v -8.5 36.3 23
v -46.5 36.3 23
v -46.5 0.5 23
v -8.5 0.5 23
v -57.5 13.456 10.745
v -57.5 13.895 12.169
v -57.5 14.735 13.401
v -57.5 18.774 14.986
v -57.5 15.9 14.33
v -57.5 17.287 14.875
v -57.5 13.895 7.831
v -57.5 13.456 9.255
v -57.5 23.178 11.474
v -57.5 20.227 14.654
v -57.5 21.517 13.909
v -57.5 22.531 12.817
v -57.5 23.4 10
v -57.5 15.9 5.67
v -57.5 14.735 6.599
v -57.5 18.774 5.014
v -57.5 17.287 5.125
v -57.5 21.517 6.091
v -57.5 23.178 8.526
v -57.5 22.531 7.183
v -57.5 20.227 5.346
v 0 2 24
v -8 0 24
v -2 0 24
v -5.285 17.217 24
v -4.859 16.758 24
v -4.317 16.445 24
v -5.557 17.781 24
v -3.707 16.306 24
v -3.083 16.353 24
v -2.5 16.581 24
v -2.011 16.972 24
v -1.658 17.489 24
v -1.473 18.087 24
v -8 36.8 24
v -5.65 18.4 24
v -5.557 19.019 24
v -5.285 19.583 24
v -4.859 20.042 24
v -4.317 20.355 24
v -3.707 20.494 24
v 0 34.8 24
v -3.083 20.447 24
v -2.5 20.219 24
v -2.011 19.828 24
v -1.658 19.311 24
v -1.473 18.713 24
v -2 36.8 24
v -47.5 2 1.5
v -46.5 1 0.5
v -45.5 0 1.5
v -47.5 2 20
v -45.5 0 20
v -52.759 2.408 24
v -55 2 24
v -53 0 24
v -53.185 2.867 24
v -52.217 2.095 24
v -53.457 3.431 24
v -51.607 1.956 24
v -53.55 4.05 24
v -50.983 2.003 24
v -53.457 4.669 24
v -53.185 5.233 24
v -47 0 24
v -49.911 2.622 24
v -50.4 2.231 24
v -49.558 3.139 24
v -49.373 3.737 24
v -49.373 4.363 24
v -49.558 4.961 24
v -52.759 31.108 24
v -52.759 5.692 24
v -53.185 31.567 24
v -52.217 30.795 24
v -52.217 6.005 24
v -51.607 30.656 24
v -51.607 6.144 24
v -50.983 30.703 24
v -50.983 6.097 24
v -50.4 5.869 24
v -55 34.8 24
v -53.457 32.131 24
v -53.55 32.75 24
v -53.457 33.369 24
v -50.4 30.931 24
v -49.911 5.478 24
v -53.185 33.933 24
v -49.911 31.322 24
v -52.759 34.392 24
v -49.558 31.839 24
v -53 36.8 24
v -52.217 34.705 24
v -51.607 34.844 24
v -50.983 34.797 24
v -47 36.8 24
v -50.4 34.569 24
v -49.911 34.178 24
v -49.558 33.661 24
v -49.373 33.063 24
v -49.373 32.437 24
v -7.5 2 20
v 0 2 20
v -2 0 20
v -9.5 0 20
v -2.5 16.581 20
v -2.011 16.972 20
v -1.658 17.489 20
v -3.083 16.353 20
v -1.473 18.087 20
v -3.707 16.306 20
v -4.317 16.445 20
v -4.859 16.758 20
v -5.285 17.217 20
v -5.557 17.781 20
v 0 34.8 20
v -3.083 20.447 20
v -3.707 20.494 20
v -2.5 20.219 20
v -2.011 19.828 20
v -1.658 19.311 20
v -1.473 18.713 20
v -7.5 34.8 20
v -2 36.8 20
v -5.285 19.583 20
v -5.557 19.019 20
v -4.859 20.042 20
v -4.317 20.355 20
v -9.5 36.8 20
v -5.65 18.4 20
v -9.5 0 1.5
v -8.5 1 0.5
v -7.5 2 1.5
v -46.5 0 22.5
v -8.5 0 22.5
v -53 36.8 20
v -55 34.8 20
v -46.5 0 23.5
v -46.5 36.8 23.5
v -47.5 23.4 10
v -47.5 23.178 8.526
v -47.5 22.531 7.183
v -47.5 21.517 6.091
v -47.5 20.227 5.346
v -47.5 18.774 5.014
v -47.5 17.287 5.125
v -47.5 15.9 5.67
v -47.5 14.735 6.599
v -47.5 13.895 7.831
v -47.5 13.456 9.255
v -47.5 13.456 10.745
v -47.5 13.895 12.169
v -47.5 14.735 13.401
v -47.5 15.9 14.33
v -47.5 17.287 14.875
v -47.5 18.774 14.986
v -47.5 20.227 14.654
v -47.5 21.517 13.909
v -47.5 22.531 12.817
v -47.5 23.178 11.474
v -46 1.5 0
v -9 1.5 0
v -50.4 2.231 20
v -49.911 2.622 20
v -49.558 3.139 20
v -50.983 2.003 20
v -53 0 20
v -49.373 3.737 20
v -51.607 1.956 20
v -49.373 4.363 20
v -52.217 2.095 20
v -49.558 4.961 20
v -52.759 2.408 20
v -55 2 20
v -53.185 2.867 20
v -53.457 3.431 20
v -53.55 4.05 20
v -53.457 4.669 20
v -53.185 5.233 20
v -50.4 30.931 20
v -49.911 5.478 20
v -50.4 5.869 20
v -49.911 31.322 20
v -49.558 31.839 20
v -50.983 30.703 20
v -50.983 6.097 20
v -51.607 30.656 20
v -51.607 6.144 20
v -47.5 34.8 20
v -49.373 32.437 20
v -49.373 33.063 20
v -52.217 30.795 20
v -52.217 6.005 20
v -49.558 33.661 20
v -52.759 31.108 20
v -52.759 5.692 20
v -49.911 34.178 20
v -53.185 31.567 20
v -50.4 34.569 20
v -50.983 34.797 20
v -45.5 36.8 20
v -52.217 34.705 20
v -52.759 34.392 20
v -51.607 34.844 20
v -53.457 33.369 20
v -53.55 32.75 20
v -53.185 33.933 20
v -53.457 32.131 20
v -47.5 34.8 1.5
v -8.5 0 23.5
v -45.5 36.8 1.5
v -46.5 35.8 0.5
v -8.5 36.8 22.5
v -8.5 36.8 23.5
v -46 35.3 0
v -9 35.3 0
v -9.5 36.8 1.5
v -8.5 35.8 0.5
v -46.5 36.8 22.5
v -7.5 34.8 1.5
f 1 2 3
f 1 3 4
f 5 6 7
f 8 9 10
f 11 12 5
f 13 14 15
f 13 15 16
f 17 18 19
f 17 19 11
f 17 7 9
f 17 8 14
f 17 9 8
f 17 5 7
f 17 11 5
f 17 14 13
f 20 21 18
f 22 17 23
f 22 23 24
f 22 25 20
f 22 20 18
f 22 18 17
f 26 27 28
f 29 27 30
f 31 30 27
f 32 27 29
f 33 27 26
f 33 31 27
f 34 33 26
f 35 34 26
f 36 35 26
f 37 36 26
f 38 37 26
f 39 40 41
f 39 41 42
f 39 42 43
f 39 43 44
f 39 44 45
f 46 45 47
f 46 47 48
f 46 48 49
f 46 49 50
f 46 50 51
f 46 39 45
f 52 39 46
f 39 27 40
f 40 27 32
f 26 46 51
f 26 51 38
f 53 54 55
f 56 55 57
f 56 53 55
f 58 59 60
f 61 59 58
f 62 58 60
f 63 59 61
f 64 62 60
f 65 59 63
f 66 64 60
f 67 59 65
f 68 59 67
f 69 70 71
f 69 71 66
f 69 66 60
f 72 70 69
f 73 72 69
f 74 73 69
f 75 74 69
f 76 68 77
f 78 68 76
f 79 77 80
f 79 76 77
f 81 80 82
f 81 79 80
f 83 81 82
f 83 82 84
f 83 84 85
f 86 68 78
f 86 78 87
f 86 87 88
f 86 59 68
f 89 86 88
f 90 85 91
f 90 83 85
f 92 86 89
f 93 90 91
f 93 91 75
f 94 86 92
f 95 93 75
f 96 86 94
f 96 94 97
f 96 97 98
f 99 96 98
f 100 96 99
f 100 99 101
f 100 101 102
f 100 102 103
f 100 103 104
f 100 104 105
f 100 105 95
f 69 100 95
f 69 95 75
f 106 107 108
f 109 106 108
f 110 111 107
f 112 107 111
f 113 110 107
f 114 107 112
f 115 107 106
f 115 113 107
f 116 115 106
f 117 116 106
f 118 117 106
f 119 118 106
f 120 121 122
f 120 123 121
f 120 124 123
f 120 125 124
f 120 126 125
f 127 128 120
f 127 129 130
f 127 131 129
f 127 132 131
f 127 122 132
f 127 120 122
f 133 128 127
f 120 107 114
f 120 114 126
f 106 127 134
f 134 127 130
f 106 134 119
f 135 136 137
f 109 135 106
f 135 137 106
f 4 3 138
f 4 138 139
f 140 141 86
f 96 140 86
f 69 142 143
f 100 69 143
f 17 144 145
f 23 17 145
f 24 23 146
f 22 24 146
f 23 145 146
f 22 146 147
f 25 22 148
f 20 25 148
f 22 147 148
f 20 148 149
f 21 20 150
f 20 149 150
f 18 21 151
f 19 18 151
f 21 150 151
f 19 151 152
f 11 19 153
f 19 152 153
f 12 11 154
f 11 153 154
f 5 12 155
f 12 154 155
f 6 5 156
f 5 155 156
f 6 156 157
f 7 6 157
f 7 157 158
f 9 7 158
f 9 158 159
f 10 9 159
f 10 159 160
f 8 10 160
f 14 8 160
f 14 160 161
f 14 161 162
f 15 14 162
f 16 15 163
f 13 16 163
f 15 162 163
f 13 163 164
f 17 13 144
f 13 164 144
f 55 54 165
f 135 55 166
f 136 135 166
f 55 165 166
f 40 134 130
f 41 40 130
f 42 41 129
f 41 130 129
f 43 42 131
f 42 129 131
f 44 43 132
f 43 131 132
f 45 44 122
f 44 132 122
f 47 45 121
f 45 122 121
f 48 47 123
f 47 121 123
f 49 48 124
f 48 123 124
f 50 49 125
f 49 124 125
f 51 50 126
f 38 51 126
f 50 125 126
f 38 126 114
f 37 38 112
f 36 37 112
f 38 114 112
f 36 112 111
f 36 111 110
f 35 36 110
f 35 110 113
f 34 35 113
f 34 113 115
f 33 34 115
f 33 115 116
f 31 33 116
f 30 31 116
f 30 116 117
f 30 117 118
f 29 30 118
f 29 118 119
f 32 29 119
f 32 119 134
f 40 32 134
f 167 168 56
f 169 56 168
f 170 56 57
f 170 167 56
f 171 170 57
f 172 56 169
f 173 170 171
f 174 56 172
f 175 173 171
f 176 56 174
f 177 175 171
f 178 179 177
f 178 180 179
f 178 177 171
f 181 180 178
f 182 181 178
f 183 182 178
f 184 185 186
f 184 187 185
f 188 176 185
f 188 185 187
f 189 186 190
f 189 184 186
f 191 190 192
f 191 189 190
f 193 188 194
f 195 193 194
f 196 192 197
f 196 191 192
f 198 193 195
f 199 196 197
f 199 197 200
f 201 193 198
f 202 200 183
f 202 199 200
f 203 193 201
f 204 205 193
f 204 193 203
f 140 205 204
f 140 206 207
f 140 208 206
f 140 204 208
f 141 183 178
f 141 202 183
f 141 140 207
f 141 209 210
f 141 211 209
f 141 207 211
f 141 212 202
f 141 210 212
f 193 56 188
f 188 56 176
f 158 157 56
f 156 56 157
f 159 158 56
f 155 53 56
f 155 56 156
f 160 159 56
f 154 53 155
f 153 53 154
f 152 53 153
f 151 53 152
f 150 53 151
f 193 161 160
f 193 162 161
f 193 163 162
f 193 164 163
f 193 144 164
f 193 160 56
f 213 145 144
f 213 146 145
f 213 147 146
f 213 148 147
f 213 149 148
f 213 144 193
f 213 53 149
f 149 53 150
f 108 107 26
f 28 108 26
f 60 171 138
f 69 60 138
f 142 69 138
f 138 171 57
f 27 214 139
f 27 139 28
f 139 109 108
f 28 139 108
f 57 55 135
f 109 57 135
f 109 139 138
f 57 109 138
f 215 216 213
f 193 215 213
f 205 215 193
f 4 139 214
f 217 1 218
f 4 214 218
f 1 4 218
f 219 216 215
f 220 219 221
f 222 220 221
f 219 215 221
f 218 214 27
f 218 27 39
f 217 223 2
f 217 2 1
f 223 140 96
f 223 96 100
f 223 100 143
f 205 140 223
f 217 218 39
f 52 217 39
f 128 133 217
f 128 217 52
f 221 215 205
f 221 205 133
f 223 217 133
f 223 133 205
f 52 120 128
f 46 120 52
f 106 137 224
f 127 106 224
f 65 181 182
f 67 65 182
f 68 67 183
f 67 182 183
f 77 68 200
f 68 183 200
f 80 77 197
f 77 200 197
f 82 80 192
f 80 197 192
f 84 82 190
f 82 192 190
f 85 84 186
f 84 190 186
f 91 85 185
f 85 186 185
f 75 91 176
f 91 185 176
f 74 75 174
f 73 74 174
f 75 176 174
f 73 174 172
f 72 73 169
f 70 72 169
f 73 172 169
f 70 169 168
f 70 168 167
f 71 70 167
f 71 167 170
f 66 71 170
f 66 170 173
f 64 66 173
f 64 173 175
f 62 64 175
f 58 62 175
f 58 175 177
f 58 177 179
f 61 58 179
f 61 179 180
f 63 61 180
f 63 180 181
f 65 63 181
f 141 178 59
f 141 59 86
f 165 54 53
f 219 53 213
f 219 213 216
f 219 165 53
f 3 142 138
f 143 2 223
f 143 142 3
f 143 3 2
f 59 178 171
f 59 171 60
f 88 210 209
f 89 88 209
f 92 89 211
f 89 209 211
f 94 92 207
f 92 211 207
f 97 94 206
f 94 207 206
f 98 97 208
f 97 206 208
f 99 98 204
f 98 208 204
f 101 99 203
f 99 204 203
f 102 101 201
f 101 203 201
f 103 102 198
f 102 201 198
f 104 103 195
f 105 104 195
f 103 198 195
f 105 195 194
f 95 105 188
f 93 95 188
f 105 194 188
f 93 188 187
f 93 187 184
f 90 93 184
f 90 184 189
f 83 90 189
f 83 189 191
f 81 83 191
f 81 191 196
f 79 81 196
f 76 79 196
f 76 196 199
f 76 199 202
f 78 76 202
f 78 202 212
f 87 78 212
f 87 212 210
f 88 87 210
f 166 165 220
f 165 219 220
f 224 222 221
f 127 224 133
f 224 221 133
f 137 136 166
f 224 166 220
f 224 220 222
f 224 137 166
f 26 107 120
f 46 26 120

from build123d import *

# Parameters (mm, degrees)
SKETCH_1_W          = 55
SKETCH_1_H          = 36.8
EXTRUDE_1_DEPTH     = 24
SKETCH_2_W          = 38
SKETCH_2_H          = 36.8
CUT_EXTRUDE_1_DEPTH = 1
CHAMFER_1_SIZE      = 0.5
CHAMFER_2_SIZE      = 0.5
SKETCH_3_W          = 7.5
SKETCH_3_H          = 36.8
CUT_EXTRUDE_2_DEPTH = 20
CHAMFER_3_SIZE      = 1.5
CHAMFER_4_SIZE      = 2
CHAMFER_5_SIZE      = 2
SKETCH_4_R          = 2.1
CUT_EXTRUDE_3_DEPTH = 20
SKETCH_5_R          = 5
EXTRUDE_2_DEPTH     = 10


with BuildPart() as part:
    # 草图1 → 凸台-拉伸1 (new body)
    with BuildSketch(Plane.XY):
        with Locations((-27.5, 18.4)):
            Rectangle(SKETCH_1_W, SKETCH_1_H)
    extrude(amount=EXTRUDE_1_DEPTH)

    # 草图2 → 切除-拉伸1 (cut)
    with BuildSketch(Plane.XY.offset(24)):
        with Locations((-27.5, 18.4)):
            Rectangle(SKETCH_2_W, SKETCH_2_H)
    extrude(amount=-CUT_EXTRUDE_1_DEPTH, mode=Mode.SUBTRACT)

    # 倒角1
    chamfer_1_edges = [part.edges().sort_by_distance(p)[0] for p in [
        (-46.5, 18.4, 24),
        (-8.5, 18.4, 24),
    ]]
    chamfer(chamfer_1_edges, length=CHAMFER_1_SIZE)

    # 倒角2
    chamfer_2_edges = [part.edges().sort_by_distance(p)[0] for p in [
        (-27.5, 36.8, 23),
        (-27.5, 0, 23),
    ]]
    chamfer(chamfer_2_edges, length=CHAMFER_2_SIZE)

    # 草图3 → 切除-拉伸2 (cut)
    with BuildSketch(Plane(origin=(0, 0, 0), x_dir=(-1, 0, 0), z_dir=(0, 0, -1))):
        with Locations((3.75, 18.4)):
            Rectangle(SKETCH_3_W, SKETCH_3_H)
        with Locations((51.25, 18.4)):
            Rectangle(SKETCH_3_W, SKETCH_3_H)
    extrude(amount=-CUT_EXTRUDE_2_DEPTH, mode=Mode.SUBTRACT)

    # 倒角3
    chamfer_3_edges = [part.edges().sort_by_distance(p)[0] for p in [
        (-27.5, 0, 0),
        (-27.5, 36.8, 0),
        (-7.5, 18.4, 0),
        (-47.5, 18.4, 0),
    ]]
    chamfer(chamfer_3_edges, length=CHAMFER_3_SIZE)

    # 倒角4
    chamfer_4_edges = [part.edges().sort_by_distance(p)[0] for p in [
        (-7.5, 36.8, 10.75),
        (-7.5, 0, 10.75),
        (-47.5, 0, 10.75),
        (-47.5, 36.8, 10.75),
    ]]
    chamfer(chamfer_4_edges, length=CHAMFER_4_SIZE)

    # 倒角5
    chamfer_5_edges = [part.edges().sort_by_distance(p)[0] for p in [
        (0, 0, 22),
        (-55, 0, 22),
        (-55, 36.8, 22),
        (0, 36.8, 22),
    ]]
    chamfer(chamfer_5_edges, length=CHAMFER_5_SIZE)

    # 草图4 → 切除-拉伸3 (cut)
    with BuildSketch(Plane(origin=(0, 0, 20), x_dir=(-1, 0, 0), z_dir=(0, 0, -1))):
        with Locations((3.55, 18.4)):
            Circle(SKETCH_4_R)
        with Locations((51.45, 32.75)):
            Circle(SKETCH_4_R)
        with Locations((51.45, 4.05)):
            Circle(SKETCH_4_R)
    extrude(amount=-CUT_EXTRUDE_3_DEPTH, mode=Mode.SUBTRACT)

    # 草图5 → 凸台-拉伸2 (add)
    with BuildSketch(Plane.ZY.offset(47.5)):
        with Locations(Location((10, 18.4, 0), (0, 0, 90))):
            Circle(SKETCH_5_R)
    extrude(amount=EXTRUDE_2_DEPTH)


solid = part.part
